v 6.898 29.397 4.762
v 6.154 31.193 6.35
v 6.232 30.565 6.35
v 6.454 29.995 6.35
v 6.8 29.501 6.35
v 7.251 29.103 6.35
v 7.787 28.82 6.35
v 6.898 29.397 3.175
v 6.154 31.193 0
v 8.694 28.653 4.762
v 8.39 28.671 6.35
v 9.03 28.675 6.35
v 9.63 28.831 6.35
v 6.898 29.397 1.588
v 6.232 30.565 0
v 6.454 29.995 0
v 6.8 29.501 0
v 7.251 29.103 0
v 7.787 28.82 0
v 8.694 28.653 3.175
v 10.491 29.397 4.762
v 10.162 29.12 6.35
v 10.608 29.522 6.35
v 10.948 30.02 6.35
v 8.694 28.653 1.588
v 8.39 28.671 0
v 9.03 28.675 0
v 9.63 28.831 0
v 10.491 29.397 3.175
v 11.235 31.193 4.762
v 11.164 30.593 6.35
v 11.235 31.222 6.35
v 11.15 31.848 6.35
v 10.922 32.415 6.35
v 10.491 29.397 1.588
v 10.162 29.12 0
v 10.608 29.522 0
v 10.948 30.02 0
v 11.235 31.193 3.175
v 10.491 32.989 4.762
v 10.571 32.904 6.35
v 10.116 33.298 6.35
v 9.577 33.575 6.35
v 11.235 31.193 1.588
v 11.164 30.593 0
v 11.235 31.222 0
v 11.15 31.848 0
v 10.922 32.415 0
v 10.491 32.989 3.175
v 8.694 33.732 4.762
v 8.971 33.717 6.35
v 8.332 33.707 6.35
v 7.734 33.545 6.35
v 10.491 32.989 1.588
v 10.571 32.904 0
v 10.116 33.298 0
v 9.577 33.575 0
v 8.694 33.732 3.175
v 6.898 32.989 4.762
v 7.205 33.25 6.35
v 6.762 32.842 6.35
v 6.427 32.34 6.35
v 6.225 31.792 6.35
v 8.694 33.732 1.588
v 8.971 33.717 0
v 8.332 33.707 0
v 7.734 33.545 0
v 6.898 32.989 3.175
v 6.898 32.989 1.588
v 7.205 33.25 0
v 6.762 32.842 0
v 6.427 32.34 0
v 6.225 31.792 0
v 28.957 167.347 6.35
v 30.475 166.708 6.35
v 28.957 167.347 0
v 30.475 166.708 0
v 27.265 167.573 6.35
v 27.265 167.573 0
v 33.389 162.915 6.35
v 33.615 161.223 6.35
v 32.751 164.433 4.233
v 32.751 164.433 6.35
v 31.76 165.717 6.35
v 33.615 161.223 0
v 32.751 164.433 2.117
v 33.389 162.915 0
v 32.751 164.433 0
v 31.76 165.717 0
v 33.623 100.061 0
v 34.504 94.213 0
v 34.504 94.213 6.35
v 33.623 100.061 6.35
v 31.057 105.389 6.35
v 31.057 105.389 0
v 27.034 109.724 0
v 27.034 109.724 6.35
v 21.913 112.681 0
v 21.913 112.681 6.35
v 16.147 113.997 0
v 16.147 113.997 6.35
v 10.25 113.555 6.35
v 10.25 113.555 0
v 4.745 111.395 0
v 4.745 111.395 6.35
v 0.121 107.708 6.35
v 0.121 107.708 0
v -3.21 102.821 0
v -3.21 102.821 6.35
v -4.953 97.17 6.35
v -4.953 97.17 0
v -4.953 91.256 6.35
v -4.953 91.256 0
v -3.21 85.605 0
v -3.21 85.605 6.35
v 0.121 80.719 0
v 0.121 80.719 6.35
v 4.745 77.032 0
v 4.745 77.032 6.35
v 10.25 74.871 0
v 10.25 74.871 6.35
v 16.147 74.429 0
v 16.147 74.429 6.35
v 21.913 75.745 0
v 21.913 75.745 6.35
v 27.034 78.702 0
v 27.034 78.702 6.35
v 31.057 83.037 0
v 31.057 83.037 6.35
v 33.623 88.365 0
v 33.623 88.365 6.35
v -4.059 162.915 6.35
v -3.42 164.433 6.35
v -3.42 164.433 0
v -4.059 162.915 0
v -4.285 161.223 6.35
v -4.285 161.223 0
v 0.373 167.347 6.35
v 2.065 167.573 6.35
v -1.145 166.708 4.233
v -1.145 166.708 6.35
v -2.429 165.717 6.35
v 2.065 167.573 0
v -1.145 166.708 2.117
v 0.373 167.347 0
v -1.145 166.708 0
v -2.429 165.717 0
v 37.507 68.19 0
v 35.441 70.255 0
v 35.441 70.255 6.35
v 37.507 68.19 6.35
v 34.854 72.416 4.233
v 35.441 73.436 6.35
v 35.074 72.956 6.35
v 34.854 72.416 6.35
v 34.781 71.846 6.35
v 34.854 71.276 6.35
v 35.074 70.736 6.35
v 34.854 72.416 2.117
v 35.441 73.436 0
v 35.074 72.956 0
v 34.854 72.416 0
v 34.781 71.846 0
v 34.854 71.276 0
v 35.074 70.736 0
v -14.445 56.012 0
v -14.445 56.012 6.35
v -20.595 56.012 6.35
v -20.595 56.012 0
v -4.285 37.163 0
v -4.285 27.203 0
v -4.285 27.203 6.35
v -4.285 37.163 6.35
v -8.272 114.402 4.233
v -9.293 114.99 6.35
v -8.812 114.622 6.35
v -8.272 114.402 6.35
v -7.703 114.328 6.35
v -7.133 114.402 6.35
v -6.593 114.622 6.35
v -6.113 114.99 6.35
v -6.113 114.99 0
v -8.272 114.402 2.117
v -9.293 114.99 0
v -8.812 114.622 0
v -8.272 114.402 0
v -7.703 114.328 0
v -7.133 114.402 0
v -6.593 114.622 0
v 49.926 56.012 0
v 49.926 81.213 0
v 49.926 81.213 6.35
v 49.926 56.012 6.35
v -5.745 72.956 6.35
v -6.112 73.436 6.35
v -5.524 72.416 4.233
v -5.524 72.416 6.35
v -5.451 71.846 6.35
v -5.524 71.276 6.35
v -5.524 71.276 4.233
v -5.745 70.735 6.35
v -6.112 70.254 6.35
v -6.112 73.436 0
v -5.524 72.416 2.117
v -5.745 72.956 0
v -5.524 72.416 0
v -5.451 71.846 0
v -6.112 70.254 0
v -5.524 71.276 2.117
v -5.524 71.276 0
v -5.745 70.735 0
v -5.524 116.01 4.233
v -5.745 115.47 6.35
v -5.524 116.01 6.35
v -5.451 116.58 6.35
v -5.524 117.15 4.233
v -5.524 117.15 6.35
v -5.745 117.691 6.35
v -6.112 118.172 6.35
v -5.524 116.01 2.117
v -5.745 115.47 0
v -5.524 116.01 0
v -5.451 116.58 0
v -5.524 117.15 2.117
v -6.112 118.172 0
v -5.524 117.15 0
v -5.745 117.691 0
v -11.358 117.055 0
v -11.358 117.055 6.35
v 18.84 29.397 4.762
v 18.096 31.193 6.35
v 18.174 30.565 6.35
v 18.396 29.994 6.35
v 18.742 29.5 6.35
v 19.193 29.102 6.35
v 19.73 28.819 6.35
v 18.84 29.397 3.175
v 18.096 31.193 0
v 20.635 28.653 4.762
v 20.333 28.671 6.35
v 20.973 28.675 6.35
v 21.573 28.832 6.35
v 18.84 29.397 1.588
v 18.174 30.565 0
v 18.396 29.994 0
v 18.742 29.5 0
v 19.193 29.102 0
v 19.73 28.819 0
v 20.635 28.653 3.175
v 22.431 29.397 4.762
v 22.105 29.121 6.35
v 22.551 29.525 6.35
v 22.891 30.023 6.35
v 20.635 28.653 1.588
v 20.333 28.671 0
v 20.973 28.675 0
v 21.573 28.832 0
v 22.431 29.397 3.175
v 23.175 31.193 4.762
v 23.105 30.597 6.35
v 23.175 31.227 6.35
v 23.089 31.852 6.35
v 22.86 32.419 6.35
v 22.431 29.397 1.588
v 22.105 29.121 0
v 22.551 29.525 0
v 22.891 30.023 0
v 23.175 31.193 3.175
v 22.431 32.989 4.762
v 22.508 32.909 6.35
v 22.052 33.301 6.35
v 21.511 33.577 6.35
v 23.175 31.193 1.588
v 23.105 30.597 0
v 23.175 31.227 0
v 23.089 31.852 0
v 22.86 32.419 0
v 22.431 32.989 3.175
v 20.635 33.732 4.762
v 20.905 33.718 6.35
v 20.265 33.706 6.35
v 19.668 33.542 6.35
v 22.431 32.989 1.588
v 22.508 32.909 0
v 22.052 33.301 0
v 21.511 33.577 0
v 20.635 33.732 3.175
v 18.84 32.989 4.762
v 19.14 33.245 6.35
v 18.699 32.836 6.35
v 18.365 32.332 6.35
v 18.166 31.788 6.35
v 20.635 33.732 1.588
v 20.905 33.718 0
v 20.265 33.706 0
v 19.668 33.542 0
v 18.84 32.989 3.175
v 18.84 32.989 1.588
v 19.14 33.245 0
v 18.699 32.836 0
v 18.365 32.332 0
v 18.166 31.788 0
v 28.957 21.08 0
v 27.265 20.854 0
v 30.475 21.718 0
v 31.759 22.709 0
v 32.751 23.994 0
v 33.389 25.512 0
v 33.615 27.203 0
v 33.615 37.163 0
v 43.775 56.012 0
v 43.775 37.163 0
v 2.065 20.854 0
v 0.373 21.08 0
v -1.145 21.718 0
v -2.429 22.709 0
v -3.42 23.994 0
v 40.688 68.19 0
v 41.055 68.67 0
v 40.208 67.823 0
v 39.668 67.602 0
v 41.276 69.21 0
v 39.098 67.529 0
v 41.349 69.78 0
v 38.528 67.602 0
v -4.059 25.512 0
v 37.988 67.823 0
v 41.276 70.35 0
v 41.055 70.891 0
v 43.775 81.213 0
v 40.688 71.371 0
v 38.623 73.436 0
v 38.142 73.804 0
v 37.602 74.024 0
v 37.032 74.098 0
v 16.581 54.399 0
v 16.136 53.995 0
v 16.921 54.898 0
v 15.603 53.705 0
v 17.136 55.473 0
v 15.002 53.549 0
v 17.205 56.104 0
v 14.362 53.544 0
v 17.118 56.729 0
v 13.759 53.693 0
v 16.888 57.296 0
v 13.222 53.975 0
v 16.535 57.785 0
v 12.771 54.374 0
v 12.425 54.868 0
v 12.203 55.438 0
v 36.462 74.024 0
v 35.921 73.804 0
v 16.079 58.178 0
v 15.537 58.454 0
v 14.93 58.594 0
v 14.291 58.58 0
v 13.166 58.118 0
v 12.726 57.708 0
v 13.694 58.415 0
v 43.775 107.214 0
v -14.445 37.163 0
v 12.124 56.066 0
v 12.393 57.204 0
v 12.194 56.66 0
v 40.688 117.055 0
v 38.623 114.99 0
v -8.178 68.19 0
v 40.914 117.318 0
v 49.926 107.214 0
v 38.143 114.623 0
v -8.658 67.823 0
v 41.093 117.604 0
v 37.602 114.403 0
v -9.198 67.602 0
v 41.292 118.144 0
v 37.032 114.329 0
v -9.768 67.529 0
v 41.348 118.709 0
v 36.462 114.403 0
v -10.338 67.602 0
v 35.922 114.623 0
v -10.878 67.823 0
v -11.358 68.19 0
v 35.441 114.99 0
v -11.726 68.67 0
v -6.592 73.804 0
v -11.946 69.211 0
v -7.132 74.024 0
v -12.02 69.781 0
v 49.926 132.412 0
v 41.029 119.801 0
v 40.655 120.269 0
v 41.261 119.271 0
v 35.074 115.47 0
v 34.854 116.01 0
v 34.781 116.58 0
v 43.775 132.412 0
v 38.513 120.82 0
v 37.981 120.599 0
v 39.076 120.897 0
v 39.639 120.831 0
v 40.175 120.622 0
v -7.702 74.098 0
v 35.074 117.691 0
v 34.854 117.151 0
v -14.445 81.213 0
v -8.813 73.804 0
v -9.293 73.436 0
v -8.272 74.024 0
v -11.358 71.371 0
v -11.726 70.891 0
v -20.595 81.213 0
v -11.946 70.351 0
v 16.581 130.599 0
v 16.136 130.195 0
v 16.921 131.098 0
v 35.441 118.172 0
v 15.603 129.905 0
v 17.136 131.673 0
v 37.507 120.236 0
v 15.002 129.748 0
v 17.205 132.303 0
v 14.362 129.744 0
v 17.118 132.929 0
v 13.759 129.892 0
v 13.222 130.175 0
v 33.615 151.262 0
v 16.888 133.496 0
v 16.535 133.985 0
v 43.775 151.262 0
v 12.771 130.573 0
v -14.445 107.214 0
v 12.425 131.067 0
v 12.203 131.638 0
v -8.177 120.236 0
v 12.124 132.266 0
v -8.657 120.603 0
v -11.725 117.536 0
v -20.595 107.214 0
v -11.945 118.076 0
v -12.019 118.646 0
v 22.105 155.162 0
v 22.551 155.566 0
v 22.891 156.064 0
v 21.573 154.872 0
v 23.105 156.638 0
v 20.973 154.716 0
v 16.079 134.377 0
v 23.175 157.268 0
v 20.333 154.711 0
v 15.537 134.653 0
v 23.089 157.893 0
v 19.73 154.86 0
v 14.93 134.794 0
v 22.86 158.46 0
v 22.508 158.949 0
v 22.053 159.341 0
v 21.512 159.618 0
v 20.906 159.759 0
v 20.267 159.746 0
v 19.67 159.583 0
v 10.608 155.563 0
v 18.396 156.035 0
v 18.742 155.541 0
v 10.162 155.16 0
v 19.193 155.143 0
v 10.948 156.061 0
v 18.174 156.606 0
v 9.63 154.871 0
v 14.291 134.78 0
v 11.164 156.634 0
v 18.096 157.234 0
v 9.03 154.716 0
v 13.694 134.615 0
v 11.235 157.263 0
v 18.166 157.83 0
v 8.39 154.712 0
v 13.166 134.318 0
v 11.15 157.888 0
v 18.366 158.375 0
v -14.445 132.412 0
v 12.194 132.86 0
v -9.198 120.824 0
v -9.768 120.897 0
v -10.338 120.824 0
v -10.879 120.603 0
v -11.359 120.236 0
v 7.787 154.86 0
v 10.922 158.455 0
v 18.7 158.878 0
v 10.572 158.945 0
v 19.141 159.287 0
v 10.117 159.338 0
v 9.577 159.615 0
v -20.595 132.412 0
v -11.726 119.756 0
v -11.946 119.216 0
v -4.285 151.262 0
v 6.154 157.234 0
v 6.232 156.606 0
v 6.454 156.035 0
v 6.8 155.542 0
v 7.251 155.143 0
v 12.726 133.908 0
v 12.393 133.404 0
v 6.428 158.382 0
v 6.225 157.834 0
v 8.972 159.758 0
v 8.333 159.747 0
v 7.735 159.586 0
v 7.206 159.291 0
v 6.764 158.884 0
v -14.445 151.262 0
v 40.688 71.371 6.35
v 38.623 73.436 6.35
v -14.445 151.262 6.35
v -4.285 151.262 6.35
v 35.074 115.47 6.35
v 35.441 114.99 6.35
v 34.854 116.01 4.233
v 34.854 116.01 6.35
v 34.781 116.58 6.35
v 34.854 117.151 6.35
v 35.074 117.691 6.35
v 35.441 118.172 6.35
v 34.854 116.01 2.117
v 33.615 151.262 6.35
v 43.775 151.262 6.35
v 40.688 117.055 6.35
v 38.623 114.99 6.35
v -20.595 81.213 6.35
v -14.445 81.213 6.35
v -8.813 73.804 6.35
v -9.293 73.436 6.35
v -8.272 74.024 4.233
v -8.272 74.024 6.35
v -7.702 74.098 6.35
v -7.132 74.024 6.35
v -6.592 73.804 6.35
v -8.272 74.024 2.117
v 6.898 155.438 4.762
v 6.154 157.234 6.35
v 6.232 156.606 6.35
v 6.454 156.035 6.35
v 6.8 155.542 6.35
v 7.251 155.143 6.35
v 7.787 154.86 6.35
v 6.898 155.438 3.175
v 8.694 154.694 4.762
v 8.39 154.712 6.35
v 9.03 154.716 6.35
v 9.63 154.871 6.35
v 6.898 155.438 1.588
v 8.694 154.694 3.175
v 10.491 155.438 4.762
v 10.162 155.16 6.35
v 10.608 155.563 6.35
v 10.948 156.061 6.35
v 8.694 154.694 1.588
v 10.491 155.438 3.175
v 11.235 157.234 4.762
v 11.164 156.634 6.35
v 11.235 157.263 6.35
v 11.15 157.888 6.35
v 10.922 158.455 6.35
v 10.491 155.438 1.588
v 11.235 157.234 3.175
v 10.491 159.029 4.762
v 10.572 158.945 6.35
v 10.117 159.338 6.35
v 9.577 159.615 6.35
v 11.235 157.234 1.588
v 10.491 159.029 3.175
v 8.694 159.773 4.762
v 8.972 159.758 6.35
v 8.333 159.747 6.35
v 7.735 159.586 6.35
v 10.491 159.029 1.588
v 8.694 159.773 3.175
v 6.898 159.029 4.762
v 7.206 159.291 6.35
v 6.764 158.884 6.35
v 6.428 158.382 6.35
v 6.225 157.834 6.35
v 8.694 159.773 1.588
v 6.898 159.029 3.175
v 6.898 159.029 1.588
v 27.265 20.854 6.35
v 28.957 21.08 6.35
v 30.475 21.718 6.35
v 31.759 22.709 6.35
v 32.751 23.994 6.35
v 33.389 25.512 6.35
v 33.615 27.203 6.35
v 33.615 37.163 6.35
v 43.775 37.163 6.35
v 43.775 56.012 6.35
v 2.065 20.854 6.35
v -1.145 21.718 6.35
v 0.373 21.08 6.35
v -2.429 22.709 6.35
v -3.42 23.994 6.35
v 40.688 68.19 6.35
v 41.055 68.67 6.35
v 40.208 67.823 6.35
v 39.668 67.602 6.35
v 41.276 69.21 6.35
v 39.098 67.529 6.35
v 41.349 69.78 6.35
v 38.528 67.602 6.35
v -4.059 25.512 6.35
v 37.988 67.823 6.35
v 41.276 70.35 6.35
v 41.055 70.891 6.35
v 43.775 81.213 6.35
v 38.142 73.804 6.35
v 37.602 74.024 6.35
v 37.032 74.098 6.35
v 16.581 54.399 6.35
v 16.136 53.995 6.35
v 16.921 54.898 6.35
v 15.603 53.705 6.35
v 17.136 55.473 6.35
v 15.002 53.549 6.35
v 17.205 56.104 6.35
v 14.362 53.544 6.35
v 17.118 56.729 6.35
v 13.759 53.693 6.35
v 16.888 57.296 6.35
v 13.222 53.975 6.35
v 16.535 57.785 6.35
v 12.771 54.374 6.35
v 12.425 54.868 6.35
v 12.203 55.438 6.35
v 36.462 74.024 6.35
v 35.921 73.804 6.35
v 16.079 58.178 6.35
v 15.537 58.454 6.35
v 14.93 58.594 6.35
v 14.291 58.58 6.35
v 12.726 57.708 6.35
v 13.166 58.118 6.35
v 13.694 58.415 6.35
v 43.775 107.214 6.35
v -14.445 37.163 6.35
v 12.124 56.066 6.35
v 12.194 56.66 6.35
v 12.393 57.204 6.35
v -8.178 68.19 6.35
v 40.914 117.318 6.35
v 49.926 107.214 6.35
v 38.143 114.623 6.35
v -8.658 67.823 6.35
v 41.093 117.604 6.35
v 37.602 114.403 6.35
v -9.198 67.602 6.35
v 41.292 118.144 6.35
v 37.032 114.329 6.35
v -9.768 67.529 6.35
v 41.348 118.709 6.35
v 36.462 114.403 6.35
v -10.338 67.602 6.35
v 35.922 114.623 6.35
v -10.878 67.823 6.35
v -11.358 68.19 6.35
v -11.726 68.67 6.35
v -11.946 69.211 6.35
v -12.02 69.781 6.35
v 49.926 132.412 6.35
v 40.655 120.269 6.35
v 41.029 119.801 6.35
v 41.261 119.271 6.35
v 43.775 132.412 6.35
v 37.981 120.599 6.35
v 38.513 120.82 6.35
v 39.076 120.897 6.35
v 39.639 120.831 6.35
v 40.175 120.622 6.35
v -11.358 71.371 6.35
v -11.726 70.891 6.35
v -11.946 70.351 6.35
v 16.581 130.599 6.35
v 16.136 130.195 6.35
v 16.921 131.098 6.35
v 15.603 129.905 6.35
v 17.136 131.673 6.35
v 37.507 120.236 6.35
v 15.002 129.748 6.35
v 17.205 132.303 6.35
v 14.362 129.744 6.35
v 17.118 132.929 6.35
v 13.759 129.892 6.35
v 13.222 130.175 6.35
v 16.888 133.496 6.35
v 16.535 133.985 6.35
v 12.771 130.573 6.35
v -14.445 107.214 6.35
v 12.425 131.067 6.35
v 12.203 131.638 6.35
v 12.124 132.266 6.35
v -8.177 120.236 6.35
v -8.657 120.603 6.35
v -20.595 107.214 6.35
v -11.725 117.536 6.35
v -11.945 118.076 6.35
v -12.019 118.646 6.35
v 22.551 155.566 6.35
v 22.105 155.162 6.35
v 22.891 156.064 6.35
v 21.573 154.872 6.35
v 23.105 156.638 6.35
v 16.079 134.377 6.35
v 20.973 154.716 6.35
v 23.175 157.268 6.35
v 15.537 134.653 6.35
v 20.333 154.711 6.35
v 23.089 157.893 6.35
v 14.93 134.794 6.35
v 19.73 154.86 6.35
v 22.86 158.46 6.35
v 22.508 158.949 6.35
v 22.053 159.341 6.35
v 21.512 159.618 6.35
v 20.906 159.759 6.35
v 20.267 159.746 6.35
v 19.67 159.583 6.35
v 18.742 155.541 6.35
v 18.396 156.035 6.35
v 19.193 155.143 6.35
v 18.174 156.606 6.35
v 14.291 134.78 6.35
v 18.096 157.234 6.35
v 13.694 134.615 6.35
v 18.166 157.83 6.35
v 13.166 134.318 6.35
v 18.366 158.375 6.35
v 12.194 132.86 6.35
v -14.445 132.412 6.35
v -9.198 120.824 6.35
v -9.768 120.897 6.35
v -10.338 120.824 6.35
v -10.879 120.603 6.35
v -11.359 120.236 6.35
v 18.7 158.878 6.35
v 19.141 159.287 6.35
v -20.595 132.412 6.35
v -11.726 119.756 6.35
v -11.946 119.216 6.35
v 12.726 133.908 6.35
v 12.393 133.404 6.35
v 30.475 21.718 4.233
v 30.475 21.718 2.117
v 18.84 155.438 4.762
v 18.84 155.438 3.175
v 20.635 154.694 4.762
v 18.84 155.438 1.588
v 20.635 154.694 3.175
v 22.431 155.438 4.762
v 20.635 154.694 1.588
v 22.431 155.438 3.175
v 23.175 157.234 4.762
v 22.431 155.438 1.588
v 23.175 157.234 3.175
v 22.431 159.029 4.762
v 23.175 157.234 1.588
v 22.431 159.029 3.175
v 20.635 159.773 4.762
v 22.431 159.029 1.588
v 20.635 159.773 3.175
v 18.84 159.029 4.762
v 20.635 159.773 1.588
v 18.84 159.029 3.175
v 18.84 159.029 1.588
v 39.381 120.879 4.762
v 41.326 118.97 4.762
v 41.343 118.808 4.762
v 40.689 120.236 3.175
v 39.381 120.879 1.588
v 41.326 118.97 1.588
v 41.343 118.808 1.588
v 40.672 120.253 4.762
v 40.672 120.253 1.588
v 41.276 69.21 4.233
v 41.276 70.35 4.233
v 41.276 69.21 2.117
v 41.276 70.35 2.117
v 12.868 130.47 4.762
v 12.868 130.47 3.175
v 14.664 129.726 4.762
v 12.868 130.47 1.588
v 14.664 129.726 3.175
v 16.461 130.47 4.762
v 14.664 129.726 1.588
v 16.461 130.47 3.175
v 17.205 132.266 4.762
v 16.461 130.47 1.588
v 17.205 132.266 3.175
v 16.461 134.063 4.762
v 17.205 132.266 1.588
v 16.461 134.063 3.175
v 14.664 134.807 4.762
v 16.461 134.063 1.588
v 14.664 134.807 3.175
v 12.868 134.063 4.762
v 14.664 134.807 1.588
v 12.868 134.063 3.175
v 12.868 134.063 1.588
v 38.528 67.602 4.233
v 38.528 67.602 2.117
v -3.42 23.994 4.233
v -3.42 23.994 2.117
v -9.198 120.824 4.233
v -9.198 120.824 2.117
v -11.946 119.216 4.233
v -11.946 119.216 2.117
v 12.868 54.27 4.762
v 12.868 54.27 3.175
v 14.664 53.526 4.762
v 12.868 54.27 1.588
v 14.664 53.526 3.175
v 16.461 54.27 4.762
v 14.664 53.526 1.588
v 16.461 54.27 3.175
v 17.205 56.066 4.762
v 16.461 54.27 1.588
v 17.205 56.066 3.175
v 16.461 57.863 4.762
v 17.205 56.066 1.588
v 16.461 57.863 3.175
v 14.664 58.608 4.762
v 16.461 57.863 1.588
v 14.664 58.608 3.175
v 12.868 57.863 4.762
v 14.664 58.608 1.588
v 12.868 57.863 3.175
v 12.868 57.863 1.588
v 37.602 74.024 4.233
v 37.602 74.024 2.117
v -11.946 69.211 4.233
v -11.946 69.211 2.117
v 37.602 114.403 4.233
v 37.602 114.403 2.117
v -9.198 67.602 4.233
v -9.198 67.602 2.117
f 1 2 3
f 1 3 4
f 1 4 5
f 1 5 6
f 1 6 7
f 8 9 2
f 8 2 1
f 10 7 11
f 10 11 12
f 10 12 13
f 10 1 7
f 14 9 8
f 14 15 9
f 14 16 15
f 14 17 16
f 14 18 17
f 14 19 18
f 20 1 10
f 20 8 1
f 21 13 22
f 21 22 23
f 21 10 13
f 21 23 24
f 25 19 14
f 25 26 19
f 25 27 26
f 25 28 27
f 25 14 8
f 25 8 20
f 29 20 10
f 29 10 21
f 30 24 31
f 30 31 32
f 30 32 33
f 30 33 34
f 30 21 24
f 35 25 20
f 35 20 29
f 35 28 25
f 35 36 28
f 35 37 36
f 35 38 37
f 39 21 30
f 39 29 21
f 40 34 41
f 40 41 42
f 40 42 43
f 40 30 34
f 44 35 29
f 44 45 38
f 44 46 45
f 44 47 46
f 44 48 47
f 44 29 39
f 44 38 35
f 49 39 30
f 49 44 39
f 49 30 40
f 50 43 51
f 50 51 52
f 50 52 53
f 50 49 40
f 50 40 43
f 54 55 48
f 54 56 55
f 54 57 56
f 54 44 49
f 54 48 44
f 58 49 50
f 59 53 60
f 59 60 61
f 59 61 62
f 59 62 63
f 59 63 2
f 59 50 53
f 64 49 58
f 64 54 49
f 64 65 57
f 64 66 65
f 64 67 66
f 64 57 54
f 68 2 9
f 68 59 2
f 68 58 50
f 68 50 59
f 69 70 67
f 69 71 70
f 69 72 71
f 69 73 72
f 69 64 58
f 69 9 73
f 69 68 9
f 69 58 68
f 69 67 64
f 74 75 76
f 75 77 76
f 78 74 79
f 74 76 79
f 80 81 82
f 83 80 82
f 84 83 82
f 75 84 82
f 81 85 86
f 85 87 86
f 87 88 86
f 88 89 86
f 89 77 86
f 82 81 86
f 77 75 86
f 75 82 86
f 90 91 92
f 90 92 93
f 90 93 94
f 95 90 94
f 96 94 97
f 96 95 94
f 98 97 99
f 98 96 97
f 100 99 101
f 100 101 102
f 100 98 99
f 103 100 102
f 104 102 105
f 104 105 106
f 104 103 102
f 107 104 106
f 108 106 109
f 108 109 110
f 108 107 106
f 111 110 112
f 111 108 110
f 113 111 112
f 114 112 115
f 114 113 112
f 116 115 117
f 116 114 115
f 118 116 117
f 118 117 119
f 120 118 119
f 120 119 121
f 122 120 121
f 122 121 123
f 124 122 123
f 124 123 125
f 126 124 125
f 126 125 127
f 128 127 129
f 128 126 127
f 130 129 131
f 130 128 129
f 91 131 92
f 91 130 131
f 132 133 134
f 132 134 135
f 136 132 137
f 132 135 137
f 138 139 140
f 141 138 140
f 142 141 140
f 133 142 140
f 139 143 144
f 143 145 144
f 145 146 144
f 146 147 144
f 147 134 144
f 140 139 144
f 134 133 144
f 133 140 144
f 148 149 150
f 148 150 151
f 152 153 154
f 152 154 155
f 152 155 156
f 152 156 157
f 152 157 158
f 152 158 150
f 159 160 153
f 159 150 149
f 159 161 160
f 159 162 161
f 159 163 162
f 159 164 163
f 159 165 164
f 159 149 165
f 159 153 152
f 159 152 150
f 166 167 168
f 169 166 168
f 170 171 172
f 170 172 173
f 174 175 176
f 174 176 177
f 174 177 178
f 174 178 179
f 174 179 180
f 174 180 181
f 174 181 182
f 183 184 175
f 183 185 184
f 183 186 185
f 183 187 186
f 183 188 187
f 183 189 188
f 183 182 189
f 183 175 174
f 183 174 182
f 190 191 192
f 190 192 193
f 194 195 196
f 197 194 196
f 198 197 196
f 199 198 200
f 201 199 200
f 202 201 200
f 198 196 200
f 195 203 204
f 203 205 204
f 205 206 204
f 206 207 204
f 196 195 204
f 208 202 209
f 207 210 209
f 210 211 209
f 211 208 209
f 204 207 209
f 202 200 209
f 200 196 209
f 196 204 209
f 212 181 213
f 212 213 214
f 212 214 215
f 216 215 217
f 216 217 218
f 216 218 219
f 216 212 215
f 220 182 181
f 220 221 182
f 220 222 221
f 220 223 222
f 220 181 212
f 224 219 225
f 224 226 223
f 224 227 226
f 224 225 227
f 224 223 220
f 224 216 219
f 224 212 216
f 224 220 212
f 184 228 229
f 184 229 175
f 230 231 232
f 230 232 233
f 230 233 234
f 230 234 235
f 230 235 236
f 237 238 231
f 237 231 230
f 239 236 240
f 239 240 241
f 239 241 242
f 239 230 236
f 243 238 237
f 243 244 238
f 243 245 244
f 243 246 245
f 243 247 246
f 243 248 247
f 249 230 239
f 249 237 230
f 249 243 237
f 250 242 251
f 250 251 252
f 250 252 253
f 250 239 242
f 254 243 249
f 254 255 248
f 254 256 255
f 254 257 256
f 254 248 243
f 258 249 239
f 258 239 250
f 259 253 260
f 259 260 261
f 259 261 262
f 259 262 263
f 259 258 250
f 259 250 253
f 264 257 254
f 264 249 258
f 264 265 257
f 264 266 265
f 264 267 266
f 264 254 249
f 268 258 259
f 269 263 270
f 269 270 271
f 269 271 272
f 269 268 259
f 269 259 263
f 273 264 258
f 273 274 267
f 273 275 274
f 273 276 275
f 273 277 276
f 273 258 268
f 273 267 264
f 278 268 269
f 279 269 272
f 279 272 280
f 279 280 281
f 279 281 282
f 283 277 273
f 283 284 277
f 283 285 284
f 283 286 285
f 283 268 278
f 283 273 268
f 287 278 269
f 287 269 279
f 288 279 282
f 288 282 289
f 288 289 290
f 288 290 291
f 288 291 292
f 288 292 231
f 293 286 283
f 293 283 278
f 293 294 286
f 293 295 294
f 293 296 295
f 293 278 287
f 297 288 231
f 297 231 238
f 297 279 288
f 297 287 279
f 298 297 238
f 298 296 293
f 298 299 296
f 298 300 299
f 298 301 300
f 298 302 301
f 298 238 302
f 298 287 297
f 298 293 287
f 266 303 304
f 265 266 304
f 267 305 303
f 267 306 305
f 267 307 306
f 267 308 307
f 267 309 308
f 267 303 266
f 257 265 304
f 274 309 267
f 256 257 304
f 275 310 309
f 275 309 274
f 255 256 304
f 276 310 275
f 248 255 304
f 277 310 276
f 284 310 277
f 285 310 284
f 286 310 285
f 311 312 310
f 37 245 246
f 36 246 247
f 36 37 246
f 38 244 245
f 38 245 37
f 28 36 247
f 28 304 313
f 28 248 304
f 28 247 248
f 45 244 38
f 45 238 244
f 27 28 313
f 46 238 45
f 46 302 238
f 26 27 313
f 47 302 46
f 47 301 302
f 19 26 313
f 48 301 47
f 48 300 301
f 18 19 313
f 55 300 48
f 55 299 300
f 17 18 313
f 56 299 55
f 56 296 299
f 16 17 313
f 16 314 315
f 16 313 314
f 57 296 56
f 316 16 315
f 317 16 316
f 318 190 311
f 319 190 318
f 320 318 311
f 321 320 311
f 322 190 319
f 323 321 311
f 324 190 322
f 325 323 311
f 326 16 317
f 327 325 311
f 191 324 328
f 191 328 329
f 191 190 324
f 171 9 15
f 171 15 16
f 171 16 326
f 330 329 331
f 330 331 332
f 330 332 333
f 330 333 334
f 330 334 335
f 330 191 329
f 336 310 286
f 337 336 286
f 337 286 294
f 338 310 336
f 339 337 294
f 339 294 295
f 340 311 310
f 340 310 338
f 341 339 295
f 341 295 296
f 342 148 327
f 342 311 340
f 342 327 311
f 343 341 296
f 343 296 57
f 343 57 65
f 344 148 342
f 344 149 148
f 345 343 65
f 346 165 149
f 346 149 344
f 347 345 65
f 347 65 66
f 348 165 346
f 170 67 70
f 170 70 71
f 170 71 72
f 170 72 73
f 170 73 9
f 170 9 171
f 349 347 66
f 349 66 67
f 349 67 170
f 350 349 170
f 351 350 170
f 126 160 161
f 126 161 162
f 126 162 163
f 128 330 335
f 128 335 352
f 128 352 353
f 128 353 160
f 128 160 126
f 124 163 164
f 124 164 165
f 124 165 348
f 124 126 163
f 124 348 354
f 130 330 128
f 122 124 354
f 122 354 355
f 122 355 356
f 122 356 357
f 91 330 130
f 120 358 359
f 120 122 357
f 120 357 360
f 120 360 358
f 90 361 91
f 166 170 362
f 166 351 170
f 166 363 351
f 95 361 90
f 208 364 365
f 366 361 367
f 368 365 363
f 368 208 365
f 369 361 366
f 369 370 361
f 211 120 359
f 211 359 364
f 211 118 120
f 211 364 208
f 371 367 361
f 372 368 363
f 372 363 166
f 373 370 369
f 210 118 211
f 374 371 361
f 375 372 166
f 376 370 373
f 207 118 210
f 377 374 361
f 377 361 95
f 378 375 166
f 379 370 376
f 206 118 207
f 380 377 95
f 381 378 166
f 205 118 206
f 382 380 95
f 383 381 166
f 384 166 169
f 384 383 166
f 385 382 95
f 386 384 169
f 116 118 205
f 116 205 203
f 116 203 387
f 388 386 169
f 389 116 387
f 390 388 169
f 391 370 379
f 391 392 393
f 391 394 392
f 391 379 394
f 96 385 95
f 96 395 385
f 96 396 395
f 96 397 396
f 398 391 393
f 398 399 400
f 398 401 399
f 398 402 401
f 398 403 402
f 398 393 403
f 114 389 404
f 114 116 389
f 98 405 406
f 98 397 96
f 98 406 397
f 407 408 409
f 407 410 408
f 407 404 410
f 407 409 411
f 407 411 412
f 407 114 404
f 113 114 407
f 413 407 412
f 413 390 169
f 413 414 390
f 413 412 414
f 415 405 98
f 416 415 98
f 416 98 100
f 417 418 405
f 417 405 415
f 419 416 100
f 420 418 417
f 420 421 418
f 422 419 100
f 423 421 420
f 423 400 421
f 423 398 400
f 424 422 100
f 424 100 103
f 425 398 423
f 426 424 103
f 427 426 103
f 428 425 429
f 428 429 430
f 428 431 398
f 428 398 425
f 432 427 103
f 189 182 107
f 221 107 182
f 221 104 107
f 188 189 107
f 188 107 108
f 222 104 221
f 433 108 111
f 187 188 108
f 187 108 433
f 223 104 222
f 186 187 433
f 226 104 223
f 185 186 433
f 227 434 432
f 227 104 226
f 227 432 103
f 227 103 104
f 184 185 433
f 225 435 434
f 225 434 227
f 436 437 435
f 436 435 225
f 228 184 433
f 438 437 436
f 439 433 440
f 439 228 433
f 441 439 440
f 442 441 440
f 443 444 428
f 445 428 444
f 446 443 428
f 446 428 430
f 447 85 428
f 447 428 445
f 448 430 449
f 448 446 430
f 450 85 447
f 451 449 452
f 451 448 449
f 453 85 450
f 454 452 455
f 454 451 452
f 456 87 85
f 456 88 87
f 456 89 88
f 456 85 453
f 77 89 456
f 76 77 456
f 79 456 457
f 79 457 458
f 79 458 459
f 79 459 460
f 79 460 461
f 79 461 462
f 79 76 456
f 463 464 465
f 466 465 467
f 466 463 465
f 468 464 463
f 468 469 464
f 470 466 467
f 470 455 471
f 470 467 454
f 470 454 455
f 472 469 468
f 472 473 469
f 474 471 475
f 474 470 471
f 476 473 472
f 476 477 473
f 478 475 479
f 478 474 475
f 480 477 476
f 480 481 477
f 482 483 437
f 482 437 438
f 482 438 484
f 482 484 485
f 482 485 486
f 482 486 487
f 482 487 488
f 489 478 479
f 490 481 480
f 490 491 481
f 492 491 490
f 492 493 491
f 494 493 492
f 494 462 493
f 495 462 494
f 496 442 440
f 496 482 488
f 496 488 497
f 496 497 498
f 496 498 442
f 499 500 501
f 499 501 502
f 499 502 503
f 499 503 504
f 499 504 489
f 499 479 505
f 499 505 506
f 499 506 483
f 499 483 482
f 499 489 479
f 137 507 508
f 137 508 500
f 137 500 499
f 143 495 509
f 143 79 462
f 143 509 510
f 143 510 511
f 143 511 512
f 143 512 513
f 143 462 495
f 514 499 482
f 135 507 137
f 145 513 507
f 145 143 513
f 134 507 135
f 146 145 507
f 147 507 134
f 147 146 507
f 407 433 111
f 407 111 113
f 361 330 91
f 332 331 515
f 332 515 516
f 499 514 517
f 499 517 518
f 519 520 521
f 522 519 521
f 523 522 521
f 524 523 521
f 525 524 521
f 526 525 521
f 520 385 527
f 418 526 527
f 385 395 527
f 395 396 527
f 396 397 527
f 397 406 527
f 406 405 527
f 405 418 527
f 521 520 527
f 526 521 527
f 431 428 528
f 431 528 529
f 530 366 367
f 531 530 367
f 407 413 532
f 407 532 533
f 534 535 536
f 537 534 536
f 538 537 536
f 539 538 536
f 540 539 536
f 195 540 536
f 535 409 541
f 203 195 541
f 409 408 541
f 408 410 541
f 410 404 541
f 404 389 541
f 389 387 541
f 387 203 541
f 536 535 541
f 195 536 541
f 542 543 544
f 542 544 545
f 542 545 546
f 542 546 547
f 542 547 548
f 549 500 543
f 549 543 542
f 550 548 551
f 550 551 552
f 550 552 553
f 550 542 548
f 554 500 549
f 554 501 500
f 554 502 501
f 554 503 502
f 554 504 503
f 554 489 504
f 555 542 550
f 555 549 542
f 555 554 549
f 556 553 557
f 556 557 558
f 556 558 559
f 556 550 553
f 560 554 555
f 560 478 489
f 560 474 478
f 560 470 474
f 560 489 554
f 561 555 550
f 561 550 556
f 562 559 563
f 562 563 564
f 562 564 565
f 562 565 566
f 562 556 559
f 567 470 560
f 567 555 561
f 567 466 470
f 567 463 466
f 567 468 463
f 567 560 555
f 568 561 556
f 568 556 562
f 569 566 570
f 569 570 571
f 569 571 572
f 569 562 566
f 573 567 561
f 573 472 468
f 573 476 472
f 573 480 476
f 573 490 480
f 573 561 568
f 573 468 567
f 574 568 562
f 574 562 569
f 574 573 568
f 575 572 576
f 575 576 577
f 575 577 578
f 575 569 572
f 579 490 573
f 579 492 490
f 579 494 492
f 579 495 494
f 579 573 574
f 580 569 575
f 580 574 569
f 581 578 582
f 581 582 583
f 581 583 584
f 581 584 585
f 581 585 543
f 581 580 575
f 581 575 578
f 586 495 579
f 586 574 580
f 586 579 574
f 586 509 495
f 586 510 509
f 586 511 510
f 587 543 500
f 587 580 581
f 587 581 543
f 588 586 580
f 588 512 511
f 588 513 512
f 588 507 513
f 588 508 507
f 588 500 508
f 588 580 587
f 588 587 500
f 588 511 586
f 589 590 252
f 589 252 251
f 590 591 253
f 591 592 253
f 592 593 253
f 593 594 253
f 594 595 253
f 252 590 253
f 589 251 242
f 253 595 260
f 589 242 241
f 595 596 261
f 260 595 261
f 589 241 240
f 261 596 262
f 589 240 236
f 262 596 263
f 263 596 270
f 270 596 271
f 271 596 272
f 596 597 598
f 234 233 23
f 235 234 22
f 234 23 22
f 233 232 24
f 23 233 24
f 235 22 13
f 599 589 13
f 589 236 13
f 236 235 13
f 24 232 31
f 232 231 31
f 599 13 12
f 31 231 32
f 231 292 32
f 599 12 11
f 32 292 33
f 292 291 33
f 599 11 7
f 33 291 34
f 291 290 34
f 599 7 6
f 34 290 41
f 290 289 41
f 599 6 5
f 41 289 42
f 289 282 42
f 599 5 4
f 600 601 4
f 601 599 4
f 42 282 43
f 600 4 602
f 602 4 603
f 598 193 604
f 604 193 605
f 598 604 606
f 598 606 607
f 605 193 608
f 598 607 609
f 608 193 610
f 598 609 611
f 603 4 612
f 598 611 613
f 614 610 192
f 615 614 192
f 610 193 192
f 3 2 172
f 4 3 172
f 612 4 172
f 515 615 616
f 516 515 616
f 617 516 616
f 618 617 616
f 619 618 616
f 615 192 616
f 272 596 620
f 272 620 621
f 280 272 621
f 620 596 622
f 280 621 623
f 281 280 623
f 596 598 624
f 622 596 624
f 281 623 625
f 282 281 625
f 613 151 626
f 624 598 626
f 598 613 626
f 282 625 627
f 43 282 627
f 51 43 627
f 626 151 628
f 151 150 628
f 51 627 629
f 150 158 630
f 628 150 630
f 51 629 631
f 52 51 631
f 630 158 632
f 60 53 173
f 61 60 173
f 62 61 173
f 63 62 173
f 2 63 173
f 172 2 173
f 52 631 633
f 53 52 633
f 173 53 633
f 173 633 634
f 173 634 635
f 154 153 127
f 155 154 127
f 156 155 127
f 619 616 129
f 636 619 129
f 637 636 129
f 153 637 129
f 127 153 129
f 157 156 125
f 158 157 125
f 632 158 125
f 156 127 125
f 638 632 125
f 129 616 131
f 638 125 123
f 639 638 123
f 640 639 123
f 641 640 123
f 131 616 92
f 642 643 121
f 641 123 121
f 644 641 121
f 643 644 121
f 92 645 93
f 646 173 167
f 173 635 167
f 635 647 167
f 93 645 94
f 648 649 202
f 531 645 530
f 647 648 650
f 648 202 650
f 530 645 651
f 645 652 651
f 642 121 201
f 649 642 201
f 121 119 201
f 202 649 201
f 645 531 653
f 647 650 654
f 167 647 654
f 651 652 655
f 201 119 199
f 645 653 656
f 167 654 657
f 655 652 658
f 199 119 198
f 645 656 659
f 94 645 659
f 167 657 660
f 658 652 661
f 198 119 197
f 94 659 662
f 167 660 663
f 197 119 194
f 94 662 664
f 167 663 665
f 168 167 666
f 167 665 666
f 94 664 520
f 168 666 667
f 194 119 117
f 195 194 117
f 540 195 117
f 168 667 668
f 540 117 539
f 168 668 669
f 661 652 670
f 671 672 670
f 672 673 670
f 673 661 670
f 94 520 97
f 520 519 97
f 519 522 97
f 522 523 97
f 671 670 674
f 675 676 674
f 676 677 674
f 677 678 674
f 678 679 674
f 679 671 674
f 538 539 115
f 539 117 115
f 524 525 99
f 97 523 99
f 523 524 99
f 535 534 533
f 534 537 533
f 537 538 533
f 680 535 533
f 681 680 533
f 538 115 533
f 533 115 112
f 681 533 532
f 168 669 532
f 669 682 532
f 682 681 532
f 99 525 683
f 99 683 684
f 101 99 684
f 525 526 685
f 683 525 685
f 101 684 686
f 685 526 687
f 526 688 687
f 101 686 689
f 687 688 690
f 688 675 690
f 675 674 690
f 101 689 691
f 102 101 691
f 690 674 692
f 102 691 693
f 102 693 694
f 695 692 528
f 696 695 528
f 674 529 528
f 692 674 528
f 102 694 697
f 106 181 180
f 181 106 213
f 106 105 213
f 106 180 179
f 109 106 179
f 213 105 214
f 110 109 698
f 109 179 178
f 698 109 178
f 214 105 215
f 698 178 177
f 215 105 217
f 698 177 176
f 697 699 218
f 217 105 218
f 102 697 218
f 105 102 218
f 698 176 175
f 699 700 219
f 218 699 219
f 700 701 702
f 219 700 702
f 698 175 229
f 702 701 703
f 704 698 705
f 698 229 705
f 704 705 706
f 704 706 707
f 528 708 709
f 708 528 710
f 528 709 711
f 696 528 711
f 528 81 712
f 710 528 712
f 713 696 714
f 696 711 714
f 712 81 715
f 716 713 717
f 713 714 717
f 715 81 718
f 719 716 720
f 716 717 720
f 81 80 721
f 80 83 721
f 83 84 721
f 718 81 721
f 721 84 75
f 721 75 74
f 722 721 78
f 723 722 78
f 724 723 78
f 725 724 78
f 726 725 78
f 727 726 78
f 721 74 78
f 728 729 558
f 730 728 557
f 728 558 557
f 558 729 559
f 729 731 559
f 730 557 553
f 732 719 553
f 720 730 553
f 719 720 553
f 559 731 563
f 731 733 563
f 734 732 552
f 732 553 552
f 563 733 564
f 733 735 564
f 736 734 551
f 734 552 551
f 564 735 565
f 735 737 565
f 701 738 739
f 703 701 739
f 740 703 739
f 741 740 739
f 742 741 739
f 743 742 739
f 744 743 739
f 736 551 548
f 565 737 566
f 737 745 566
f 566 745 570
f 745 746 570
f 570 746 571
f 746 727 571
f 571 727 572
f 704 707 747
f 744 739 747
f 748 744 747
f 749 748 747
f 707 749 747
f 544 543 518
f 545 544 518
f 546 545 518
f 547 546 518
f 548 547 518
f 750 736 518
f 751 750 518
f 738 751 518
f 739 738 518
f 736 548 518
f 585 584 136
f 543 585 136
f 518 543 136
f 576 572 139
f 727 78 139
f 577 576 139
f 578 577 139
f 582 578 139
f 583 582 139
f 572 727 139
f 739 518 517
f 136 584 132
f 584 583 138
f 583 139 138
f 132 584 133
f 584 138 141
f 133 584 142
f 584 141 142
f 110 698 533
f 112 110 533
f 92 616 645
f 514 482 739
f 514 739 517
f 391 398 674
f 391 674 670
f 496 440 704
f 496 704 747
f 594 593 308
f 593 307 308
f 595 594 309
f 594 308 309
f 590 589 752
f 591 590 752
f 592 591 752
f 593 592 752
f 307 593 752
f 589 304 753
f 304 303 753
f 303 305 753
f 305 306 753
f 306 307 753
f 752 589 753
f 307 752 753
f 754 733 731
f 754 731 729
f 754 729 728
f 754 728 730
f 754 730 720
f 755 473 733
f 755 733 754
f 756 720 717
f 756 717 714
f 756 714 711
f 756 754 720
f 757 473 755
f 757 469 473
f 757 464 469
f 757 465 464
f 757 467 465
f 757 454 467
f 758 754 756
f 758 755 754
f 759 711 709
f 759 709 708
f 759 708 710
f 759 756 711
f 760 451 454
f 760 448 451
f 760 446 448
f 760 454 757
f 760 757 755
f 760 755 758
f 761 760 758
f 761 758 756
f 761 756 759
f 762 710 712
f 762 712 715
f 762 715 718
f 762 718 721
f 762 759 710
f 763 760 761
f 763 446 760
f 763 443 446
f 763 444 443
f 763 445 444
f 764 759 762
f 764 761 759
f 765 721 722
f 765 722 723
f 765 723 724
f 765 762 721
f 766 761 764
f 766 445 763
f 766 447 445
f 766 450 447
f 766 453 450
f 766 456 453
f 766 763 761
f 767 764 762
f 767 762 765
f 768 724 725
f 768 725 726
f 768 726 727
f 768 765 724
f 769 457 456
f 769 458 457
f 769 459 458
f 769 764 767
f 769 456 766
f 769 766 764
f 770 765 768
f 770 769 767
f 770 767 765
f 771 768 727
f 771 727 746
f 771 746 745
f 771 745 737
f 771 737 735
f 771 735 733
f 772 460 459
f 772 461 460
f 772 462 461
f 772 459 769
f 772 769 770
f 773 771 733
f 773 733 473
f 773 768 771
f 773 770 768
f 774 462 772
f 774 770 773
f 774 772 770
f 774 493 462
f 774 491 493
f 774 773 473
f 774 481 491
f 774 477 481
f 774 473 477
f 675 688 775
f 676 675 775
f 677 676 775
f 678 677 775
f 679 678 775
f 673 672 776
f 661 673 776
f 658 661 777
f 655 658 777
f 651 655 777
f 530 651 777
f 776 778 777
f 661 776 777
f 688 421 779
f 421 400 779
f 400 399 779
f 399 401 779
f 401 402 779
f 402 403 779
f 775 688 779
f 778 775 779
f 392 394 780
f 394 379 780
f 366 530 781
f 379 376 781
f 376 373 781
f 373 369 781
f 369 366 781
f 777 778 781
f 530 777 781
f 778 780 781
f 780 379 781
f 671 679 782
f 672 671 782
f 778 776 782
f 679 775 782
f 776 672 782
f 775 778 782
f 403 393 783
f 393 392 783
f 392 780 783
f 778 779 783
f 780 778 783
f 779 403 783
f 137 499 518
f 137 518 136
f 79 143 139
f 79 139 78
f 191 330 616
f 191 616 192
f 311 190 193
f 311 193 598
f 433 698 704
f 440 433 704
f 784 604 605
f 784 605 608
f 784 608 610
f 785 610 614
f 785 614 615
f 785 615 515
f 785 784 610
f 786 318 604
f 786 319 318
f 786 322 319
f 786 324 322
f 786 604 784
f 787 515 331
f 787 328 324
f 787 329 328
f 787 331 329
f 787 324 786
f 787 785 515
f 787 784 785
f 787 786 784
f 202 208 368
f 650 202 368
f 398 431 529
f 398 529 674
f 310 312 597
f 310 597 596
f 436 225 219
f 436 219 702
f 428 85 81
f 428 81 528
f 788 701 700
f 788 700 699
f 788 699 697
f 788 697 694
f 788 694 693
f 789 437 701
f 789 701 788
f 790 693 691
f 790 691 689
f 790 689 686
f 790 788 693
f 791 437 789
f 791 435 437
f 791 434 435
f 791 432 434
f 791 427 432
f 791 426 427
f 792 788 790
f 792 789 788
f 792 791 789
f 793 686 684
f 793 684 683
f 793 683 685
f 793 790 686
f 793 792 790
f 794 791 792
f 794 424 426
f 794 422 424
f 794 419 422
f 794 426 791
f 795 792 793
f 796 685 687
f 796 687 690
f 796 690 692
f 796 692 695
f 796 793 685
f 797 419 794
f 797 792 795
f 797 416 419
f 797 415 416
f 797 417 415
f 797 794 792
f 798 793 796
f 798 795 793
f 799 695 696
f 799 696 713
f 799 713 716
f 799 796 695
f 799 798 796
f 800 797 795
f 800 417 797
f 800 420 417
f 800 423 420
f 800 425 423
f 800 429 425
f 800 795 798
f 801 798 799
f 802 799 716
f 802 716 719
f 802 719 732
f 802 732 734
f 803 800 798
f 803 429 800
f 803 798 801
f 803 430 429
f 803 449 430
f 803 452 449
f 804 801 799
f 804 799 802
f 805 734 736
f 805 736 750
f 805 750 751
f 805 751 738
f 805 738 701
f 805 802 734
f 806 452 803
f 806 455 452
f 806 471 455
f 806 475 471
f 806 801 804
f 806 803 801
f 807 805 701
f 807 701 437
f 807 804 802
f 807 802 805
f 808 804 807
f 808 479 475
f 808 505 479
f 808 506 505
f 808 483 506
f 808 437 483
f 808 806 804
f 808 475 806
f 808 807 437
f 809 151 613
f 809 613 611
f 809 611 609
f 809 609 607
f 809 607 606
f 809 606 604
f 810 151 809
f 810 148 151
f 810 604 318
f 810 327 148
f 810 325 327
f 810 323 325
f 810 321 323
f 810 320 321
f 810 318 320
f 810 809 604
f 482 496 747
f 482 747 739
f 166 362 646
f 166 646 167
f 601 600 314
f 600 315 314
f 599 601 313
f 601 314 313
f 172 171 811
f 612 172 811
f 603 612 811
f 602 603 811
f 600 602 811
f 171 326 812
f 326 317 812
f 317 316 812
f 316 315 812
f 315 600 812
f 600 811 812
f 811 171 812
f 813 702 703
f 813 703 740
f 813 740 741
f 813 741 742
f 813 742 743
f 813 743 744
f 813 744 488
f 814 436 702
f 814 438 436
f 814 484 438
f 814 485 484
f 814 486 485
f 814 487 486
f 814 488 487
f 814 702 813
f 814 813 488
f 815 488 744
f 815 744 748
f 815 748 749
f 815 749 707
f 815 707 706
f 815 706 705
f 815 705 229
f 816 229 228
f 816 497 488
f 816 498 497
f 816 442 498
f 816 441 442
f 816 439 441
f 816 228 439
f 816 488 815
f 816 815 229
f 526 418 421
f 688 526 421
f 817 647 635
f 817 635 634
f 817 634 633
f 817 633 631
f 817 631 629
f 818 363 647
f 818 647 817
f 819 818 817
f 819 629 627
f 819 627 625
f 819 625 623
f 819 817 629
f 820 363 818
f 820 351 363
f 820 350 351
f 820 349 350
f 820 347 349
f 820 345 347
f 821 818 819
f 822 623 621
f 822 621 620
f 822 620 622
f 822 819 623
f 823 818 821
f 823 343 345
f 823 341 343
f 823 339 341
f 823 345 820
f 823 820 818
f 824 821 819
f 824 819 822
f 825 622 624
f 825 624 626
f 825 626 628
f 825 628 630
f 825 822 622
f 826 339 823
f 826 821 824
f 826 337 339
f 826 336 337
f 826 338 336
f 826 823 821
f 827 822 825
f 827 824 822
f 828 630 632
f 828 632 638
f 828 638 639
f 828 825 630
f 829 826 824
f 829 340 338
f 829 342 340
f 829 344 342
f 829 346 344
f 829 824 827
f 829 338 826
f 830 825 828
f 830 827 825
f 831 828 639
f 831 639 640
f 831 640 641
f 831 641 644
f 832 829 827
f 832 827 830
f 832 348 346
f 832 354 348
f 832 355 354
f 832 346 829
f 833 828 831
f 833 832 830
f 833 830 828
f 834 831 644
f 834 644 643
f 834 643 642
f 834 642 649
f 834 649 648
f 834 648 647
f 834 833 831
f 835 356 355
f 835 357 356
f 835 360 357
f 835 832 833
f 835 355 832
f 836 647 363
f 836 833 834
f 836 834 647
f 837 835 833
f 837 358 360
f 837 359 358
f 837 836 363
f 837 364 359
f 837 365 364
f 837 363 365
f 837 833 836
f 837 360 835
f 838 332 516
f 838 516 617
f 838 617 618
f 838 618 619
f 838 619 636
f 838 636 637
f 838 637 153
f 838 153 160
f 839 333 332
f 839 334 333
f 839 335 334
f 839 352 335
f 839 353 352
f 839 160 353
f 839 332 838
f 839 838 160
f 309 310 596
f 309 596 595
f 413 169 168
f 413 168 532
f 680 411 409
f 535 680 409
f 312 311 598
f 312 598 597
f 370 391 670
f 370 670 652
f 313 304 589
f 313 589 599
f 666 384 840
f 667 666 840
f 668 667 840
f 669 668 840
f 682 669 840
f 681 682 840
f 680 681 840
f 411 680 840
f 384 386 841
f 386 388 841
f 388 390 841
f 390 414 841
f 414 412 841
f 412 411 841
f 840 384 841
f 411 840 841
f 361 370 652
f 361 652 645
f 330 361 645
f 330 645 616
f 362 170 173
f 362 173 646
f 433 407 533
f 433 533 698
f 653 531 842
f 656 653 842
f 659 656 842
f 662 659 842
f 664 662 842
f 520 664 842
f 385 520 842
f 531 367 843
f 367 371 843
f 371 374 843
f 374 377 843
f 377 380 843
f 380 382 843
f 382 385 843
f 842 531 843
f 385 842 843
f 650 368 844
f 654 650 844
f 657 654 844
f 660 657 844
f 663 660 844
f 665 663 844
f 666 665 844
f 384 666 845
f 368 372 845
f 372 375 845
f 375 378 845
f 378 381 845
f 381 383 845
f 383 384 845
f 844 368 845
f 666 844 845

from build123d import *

# Parameters (mm, degrees)
MODEL_R             = 19.83955
BOSS_EXTRUDE1_DEPTH = 6.35


with BuildPart() as part:
    # Model → Boss-Extrude1 (new body)
    with BuildSketch(Plane.XY):
        with BuildLine():
            Line((-20.5954, 56.0124), (-20.5954, 81.2129))
            Line((-20.5954, 81.2129), (-14.4452, 81.2129))
            Line((-14.4452, 81.2129), (-14.4452, 107.2136))
            Line((-14.4452, 107.2136), (-20.5954, 107.2136))
            Line((-20.5954, 107.2136), (-20.5954, 132.4124))
            Line((-20.5954, 132.4124), (-14.4452, 132.4124))
            Line((-14.4452, 132.4124), (-14.4452, 151.262))
            Line((-14.4452, 151.262), (-4.2849, 151.262))
            Line((-4.2849, 151.262), (-4.2849, 161.223))
            add(Edge.make_bspline(
                [(2.0647, 167.573), (-1.4529, 167.573), (-4.2849, 164.741), (-4.2849, 161.223)],
                knots=[0.181818182, 0.181818182, 0.181818182, 0.181818182, 0.212121212, 0.212121212, 0.212121212, 0.212121212], degree=3))
            Line((2.0647, 167.573), (27.2651, 167.573))
            add(Edge.make_bspline(
                [(33.6151, 161.223), (33.6151, 164.741), (30.7835, 167.573), (27.2651, 167.573)],
                knots=[0.121212121, 0.121212121, 0.121212121, 0.121212121, 0.151515152, 0.151515152, 0.151515152, 0.151515152], degree=3))
            Line((33.6151, 161.223), (33.6151, 151.262))
            Line((33.6151, 151.262), (43.7754, 151.262))
            Line((43.7754, 151.262), (43.7754, 132.4124))
            Line((43.7754, 132.4124), (49.9256, 132.4124))
            Line((49.9256, 132.4124), (49.9256, 107.2136))
            Line((49.9256, 107.2136), (43.7754, 107.2136))
            Line((43.7754, 107.2136), (43.7754, 81.2129))
            Line((43.7754, 81.2129), (49.9256, 81.2129))
            Line((49.9256, 81.2129), (49.9256, 56.0124))
            Line((49.9256, 56.0124), (43.7754, 56.0124))
            Line((43.7754, 56.0124), (43.7754, 37.1628))
            Line((43.7754, 37.1628), (33.6151, 37.1628))
            Line((33.6151, 37.1628), (33.6151, 27.2034))
            add(Edge.make_bspline(
                [(27.2651, 20.8535), (30.7835, 20.8535), (33.6151, 23.6854), (33.6151, 27.2034)],
                knots=[0.666666667, 0.666666667, 0.666666667, 0.666666667, 0.696969697, 0.696969697, 0.696969697, 0.696969697], degree=3))
            Line((27.2651, 20.8535), (2.0647, 20.8535))
            add(Edge.make_bspline(
                [(-4.2849, 27.2034), (-4.2849, 23.6854), (-1.4529, 20.8535), (2.0647, 20.8535)],
                knots=[0.606060606, 0.606060606, 0.606060606, 0.606060606, 0.636363636, 0.636363636, 0.636363636, 0.636363636], degree=3))
            Line((-4.2849, 27.2034), (-4.2849, 37.1628))
            Line((-4.2849, 37.1628), (-14.4452, 37.1628))
            Line((-14.4452, 37.1628), (-14.4452, 56.0124))
            Line((-14.4452, 56.0124), (-20.5954, 56.0124))
        make_face()
        with Locations((14.6645, 94.21325)):
            Circle(MODEL_R, mode=Mode.SUBTRACT)
        with BuildLine():
            Line((-6.1122, 70.2543), (-8.1775, 68.1903))
            add(Edge.make_bspline(
                [(-8.1775, 68.1903), (-9.0583, 67.3086), (-10.4778, 67.3086), (-11.3583, 68.1903)],
                knots=[0.142857143, 0.142857143, 0.142857143, 0.142857143, 0.285714286, 0.285714286, 0.285714286, 0.285714286], degree=3))
            add(Edge.make_bspline(
                [(-11.3583, 68.1903), (-12.2399, 69.0707), (-12.2399, 70.4906), (-11.3583, 71.3711)],
                knots=[0.285714286, 0.285714286, 0.285714286, 0.285714286, 0.428571429, 0.428571429, 0.428571429, 0.428571429], degree=3))
            Line((-11.3583, 71.3711), (-9.293, 73.4364))
            add(Edge.make_bspline(
                [(-9.293, 73.4364), (-8.4121, 74.3185), (-6.9926, 74.3185), (-6.1122, 73.4364)],
                knots=[0.571428571, 0.571428571, 0.571428571, 0.571428571, 0.714285714, 0.714285714, 0.714285714, 0.714285714], degree=3))
            add(Edge.make_bspline(
                [(-6.1122, 73.4364), (-5.2301, 72.5559), (-5.2301, 71.1364), (-6.1122, 70.2543)],
                knots=[0.714285714, 0.714285714, 0.714285714, 0.714285714, 1, 1, 1, 1], degree=3))
        make_face(mode=Mode.SUBTRACT)
        with BuildLine():
            Line((40.6885, 117.0554), (38.6232, 114.9897))
            add(Edge.make_bspline(
                [(38.6232, 114.9897), (37.7415, 114.1092), (36.3232, 114.1092), (35.4411, 114.9897)],
                knots=[0.142857143, 0.142857143, 0.142857143, 0.142857143, 0.285714286, 0.285714286, 0.285714286, 0.285714286], degree=3))
            add(Edge.make_bspline(
                [(35.4411, 114.9897), (34.5607, 115.8705), (34.5607, 117.29), (35.4411, 118.1717)],
                knots=[0.285714286, 0.285714286, 0.285714286, 0.285714286, 0.428571429, 0.428571429, 0.428571429, 0.428571429], degree=3))
            Line((35.4411, 118.1717), (37.5068, 120.2357))
            add(Edge.make_bspline(
                [(37.5068, 120.2357), (38.3885, 121.1178), (39.8068, 121.1178), (40.6889, 120.2357)],
                knots=[0.571428571, 0.571428571, 0.571428571, 0.571428571, 0.714285714, 0.714285714, 0.714285714, 0.714285714], degree=3))
            add(Edge.make_bspline(
                [(40.6889, 120.2357), (41.5693, 119.3553), (41.5693, 117.9358), (40.6885, 117.0554)],
                knots=[0.714285714, 0.714285714, 0.714285714, 0.714285714, 1, 1, 1, 1], degree=3))
        make_face(mode=Mode.SUBTRACT)
        with BuildLine():
            Line((40.6885, 71.3707), (38.6227, 73.4364))
            add(Edge.make_bspline(
                [(38.6227, 73.4364), (37.7411, 74.3185), (36.3228, 74.3185), (35.4407, 73.4364)],
                knots=[0.142857143, 0.142857143, 0.142857143, 0.142857143, 0.285714286, 0.285714286, 0.285714286, 0.285714286], degree=3))
            add(Edge.make_bspline(
                [(35.4407, 73.4364), (34.5603, 72.5559), (34.5607, 71.1368), (35.4411, 70.2547)],
                knots=[0.285714286, 0.285714286, 0.285714286, 0.285714286, 0.428571429, 0.428571429, 0.428571429, 0.428571429], degree=3))
            Line((35.4411, 70.2547), (37.5068, 68.1903))
            add(Edge.make_bspline(
                [(37.5068, 68.1903), (38.3889, 67.3086), (39.8064, 67.3086), (40.6885, 68.1903)],
                knots=[0.571428571, 0.571428571, 0.571428571, 0.571428571, 0.714285714, 0.714285714, 0.714285714, 0.714285714], degree=3))
            add(Edge.make_bspline(
                [(40.6885, 68.1903), (41.5689, 69.0707), (41.5693, 70.4902), (40.6885, 71.3707)],
                knots=[0.714285714, 0.714285714, 0.714285714, 0.714285714, 1, 1, 1, 1], degree=3))
        make_face(mode=Mode.SUBTRACT)
        with BuildLine():
            Line((-6.1122, 118.1717), (-8.1766, 120.2357))
            add(Edge.make_bspline(
                [(-8.1766, 120.2357), (-9.0587, 121.1178), (-10.4782, 121.1178), (-11.3587, 120.2357)],
                knots=[0.142857143, 0.142857143, 0.142857143, 0.142857143, 0.285714286, 0.285714286, 0.285714286, 0.285714286], degree=3))
            add(Edge.make_bspline(
                [(-11.3587, 120.2357), (-12.2391, 119.3553), (-12.2387, 117.9362), (-11.3583, 117.0554)],
                knots=[0.285714286, 0.285714286, 0.285714286, 0.285714286, 0.428571429, 0.428571429, 0.428571429, 0.428571429], degree=3))
            Line((-11.3583, 117.0554), (-9.2926, 114.9897))
            add(Edge.make_bspline(
                [(-9.2926, 114.9897), (-8.4121, 114.1076), (-6.993, 114.1076), (-6.1126, 114.9897)],
                knots=[0.571428571, 0.571428571, 0.571428571, 0.571428571, 0.714285714, 0.714285714, 0.714285714, 0.714285714], degree=3))
            add(Edge.make_bspline(
                [(-6.1126, 114.9897), (-5.2305, 115.8705), (-5.2301, 117.2896), (-6.1122, 118.1717)],
                knots=[0.714285714, 0.714285714, 0.714285714, 0.714285714, 1, 1, 1, 1], degree=3))
        make_face(mode=Mode.SUBTRACT)
        with BuildLine():
            add(Edge.make_bspline(
                [(8.6945, 154.6937), (10.0978, 154.6937), (11.2349, 155.8307), (11.2349, 157.2336)],
                knots=[0, 0, 0, 0, 0.2, 0.2, 0.2, 0.2], degree=3))
            add(Edge.make_bspline(
                [(11.2349, 157.2336), (11.2349, 158.6365), (10.0978, 159.7728), (8.6945, 159.7728)],
                knots=[0.2, 0.2, 0.2, 0.2, 0.4, 0.4, 0.4, 0.4], degree=3))
            add(Edge.make_bspline(
                [(8.6945, 159.7728), (7.2921, 159.7728), (6.1537, 158.6365), (6.1537, 157.2336)],
                knots=[0.4, 0.4, 0.4, 0.4, 0.6, 0.6, 0.6, 0.6], degree=3))
            add(Edge.make_bspline(
                [(6.1537, 157.2336), (6.1537, 155.8307), (7.2921, 154.6937), (8.6945, 154.6937)],
                knots=[0.6, 0.6, 0.6, 0.6, 1, 1, 1, 1], degree=3))
        make_face(mode=Mode.SUBTRACT)
        with BuildLine():
            add(Edge.make_bspline(
                [(8.6945, 28.6532), (10.0978, 28.6532), (11.2349, 29.7899), (11.2349, 31.1928)],
                knots=[0, 0, 0, 0, 0.2, 0.2, 0.2, 0.2], degree=3))
            add(Edge.make_bspline(
                [(11.2349, 31.1928), (11.2349, 32.5953), (10.0978, 33.7324), (8.6945, 33.7324)],
                knots=[0.2, 0.2, 0.2, 0.2, 0.4, 0.4, 0.4, 0.4], degree=3))
            add(Edge.make_bspline(
                [(8.6945, 33.7324), (7.2921, 33.7324), (6.1537, 32.5953), (6.1537, 31.1928)],
                knots=[0.4, 0.4, 0.4, 0.4, 0.6, 0.6, 0.6, 0.6], degree=3))
            add(Edge.make_bspline(
                [(6.1537, 31.1928), (6.1537, 29.7899), (7.2921, 28.6532), (8.6945, 28.6532)],
                knots=[0.6, 0.6, 0.6, 0.6, 1, 1, 1, 1], degree=3))
        make_face(mode=Mode.SUBTRACT)
        with BuildLine():
            add(Edge.make_bspline(
                [(20.6352, 154.6937), (22.0385, 154.6937), (23.1752, 155.8307), (23.1752, 157.2336)],
                knots=[0, 0, 0, 0, 0.2, 0.2, 0.2, 0.2], degree=3))
            add(Edge.make_bspline(
                [(23.1752, 157.2336), (23.1752, 158.6365), (22.0385, 159.7728), (20.6352, 159.7728)],
                knots=[0.2, 0.2, 0.2, 0.2, 0.4, 0.4, 0.4, 0.4], degree=3))
            add(Edge.make_bspline(
                [(20.6352, 159.7728), (19.2328, 159.7728), (18.0957, 158.6365), (18.0957, 157.2336)],
                knots=[0.4, 0.4, 0.4, 0.4, 0.6, 0.6, 0.6, 0.6], degree=3))
            add(Edge.make_bspline(
                [(18.0957, 157.2336), (18.0957, 155.8307), (19.2328, 154.6937), (20.6352, 154.6937)],
                knots=[0.6, 0.6, 0.6, 0.6, 1, 1, 1, 1], degree=3))
        make_face(mode=Mode.SUBTRACT)
        with BuildLine():
            add(Edge.make_bspline(
                [(20.6352, 28.6532), (22.0385, 28.6532), (23.1752, 29.7899), (23.1752, 31.1928)],
                knots=[0, 0, 0, 0, 0.2, 0.2, 0.2, 0.2], degree=3))
            add(Edge.make_bspline(
                [(23.1752, 31.1928), (23.1752, 32.5953), (22.0385, 33.7324), (20.6352, 33.7324)],
                knots=[0.2, 0.2, 0.2, 0.2, 0.4, 0.4, 0.4, 0.4], degree=3))
            add(Edge.make_bspline(
                [(20.6352, 33.7324), (19.2328, 33.7324), (18.0957, 32.5953), (18.0957, 31.1928)],
                knots=[0.4, 0.4, 0.4, 0.4, 0.6, 0.6, 0.6, 0.6], degree=3))
            add(Edge.make_bspline(
                [(18.0957, 31.1928), (18.0957, 29.7899), (19.2328, 28.6532), (20.6352, 28.6532)],
                knots=[0.6, 0.6, 0.6, 0.6, 1, 1, 1, 1], degree=3))
        make_face(mode=Mode.SUBTRACT)
        with BuildLine():
            add(Edge.make_bspline(
                [(14.6645, 129.7262), (16.0674, 129.7262), (17.2053, 130.8633), (17.2053, 132.2662)],
                knots=[0, 0, 0, 0, 0.2, 0.2, 0.2, 0.2], degree=3))
            add(Edge.make_bspline(
                [(17.2053, 132.2662), (17.2053, 133.6691), (16.0674, 134.8074), (14.6645, 134.8074)],
                knots=[0.2, 0.2, 0.2, 0.2, 0.4, 0.4, 0.4, 0.4], degree=3))
            add(Edge.make_bspline(
                [(14.6645, 134.8074), (13.2616, 134.8074), (12.1245, 133.6691), (12.1245, 132.2662)],
                knots=[0.4, 0.4, 0.4, 0.4, 0.6, 0.6, 0.6, 0.6], degree=3))
            add(Edge.make_bspline(
                [(12.1245, 132.2662), (12.1245, 130.8633), (13.2616, 129.7262), (14.6645, 129.7262)],
                knots=[0.6, 0.6, 0.6, 0.6, 1, 1, 1, 1], degree=3))
        make_face(mode=Mode.SUBTRACT)
        with BuildLine():
            add(Edge.make_bspline(
                [(14.6645, 53.5264), (16.0674, 53.5264), (17.2053, 54.6635), (17.2053, 56.0664)],
                knots=[0, 0, 0, 0, 0.2, 0.2, 0.2, 0.2], degree=3))
            add(Edge.make_bspline(
                [(17.2053, 56.0664), (17.2053, 57.4693), (16.0674, 58.6076), (14.6645, 58.6076)],
                knots=[0.2, 0.2, 0.2, 0.2, 0.4, 0.4, 0.4, 0.4], degree=3))
            add(Edge.make_bspline(
                [(14.6645, 58.6076), (13.2616, 58.6076), (12.1245, 57.4693), (12.1245, 56.0664)],
                knots=[0.4, 0.4, 0.4, 0.4, 0.6, 0.6, 0.6, 0.6], degree=3))
            add(Edge.make_bspline(
                [(12.1245, 56.0664), (12.1245, 54.6635), (13.2616, 53.5264), (14.6645, 53.5264)],
                knots=[0.6, 0.6, 0.6, 0.6, 1, 1, 1, 1], degree=3))
        make_face(mode=Mode.SUBTRACT)
    extrude(amount=BOSS_EXTRUDE1_DEPTH)


solid = part.part
